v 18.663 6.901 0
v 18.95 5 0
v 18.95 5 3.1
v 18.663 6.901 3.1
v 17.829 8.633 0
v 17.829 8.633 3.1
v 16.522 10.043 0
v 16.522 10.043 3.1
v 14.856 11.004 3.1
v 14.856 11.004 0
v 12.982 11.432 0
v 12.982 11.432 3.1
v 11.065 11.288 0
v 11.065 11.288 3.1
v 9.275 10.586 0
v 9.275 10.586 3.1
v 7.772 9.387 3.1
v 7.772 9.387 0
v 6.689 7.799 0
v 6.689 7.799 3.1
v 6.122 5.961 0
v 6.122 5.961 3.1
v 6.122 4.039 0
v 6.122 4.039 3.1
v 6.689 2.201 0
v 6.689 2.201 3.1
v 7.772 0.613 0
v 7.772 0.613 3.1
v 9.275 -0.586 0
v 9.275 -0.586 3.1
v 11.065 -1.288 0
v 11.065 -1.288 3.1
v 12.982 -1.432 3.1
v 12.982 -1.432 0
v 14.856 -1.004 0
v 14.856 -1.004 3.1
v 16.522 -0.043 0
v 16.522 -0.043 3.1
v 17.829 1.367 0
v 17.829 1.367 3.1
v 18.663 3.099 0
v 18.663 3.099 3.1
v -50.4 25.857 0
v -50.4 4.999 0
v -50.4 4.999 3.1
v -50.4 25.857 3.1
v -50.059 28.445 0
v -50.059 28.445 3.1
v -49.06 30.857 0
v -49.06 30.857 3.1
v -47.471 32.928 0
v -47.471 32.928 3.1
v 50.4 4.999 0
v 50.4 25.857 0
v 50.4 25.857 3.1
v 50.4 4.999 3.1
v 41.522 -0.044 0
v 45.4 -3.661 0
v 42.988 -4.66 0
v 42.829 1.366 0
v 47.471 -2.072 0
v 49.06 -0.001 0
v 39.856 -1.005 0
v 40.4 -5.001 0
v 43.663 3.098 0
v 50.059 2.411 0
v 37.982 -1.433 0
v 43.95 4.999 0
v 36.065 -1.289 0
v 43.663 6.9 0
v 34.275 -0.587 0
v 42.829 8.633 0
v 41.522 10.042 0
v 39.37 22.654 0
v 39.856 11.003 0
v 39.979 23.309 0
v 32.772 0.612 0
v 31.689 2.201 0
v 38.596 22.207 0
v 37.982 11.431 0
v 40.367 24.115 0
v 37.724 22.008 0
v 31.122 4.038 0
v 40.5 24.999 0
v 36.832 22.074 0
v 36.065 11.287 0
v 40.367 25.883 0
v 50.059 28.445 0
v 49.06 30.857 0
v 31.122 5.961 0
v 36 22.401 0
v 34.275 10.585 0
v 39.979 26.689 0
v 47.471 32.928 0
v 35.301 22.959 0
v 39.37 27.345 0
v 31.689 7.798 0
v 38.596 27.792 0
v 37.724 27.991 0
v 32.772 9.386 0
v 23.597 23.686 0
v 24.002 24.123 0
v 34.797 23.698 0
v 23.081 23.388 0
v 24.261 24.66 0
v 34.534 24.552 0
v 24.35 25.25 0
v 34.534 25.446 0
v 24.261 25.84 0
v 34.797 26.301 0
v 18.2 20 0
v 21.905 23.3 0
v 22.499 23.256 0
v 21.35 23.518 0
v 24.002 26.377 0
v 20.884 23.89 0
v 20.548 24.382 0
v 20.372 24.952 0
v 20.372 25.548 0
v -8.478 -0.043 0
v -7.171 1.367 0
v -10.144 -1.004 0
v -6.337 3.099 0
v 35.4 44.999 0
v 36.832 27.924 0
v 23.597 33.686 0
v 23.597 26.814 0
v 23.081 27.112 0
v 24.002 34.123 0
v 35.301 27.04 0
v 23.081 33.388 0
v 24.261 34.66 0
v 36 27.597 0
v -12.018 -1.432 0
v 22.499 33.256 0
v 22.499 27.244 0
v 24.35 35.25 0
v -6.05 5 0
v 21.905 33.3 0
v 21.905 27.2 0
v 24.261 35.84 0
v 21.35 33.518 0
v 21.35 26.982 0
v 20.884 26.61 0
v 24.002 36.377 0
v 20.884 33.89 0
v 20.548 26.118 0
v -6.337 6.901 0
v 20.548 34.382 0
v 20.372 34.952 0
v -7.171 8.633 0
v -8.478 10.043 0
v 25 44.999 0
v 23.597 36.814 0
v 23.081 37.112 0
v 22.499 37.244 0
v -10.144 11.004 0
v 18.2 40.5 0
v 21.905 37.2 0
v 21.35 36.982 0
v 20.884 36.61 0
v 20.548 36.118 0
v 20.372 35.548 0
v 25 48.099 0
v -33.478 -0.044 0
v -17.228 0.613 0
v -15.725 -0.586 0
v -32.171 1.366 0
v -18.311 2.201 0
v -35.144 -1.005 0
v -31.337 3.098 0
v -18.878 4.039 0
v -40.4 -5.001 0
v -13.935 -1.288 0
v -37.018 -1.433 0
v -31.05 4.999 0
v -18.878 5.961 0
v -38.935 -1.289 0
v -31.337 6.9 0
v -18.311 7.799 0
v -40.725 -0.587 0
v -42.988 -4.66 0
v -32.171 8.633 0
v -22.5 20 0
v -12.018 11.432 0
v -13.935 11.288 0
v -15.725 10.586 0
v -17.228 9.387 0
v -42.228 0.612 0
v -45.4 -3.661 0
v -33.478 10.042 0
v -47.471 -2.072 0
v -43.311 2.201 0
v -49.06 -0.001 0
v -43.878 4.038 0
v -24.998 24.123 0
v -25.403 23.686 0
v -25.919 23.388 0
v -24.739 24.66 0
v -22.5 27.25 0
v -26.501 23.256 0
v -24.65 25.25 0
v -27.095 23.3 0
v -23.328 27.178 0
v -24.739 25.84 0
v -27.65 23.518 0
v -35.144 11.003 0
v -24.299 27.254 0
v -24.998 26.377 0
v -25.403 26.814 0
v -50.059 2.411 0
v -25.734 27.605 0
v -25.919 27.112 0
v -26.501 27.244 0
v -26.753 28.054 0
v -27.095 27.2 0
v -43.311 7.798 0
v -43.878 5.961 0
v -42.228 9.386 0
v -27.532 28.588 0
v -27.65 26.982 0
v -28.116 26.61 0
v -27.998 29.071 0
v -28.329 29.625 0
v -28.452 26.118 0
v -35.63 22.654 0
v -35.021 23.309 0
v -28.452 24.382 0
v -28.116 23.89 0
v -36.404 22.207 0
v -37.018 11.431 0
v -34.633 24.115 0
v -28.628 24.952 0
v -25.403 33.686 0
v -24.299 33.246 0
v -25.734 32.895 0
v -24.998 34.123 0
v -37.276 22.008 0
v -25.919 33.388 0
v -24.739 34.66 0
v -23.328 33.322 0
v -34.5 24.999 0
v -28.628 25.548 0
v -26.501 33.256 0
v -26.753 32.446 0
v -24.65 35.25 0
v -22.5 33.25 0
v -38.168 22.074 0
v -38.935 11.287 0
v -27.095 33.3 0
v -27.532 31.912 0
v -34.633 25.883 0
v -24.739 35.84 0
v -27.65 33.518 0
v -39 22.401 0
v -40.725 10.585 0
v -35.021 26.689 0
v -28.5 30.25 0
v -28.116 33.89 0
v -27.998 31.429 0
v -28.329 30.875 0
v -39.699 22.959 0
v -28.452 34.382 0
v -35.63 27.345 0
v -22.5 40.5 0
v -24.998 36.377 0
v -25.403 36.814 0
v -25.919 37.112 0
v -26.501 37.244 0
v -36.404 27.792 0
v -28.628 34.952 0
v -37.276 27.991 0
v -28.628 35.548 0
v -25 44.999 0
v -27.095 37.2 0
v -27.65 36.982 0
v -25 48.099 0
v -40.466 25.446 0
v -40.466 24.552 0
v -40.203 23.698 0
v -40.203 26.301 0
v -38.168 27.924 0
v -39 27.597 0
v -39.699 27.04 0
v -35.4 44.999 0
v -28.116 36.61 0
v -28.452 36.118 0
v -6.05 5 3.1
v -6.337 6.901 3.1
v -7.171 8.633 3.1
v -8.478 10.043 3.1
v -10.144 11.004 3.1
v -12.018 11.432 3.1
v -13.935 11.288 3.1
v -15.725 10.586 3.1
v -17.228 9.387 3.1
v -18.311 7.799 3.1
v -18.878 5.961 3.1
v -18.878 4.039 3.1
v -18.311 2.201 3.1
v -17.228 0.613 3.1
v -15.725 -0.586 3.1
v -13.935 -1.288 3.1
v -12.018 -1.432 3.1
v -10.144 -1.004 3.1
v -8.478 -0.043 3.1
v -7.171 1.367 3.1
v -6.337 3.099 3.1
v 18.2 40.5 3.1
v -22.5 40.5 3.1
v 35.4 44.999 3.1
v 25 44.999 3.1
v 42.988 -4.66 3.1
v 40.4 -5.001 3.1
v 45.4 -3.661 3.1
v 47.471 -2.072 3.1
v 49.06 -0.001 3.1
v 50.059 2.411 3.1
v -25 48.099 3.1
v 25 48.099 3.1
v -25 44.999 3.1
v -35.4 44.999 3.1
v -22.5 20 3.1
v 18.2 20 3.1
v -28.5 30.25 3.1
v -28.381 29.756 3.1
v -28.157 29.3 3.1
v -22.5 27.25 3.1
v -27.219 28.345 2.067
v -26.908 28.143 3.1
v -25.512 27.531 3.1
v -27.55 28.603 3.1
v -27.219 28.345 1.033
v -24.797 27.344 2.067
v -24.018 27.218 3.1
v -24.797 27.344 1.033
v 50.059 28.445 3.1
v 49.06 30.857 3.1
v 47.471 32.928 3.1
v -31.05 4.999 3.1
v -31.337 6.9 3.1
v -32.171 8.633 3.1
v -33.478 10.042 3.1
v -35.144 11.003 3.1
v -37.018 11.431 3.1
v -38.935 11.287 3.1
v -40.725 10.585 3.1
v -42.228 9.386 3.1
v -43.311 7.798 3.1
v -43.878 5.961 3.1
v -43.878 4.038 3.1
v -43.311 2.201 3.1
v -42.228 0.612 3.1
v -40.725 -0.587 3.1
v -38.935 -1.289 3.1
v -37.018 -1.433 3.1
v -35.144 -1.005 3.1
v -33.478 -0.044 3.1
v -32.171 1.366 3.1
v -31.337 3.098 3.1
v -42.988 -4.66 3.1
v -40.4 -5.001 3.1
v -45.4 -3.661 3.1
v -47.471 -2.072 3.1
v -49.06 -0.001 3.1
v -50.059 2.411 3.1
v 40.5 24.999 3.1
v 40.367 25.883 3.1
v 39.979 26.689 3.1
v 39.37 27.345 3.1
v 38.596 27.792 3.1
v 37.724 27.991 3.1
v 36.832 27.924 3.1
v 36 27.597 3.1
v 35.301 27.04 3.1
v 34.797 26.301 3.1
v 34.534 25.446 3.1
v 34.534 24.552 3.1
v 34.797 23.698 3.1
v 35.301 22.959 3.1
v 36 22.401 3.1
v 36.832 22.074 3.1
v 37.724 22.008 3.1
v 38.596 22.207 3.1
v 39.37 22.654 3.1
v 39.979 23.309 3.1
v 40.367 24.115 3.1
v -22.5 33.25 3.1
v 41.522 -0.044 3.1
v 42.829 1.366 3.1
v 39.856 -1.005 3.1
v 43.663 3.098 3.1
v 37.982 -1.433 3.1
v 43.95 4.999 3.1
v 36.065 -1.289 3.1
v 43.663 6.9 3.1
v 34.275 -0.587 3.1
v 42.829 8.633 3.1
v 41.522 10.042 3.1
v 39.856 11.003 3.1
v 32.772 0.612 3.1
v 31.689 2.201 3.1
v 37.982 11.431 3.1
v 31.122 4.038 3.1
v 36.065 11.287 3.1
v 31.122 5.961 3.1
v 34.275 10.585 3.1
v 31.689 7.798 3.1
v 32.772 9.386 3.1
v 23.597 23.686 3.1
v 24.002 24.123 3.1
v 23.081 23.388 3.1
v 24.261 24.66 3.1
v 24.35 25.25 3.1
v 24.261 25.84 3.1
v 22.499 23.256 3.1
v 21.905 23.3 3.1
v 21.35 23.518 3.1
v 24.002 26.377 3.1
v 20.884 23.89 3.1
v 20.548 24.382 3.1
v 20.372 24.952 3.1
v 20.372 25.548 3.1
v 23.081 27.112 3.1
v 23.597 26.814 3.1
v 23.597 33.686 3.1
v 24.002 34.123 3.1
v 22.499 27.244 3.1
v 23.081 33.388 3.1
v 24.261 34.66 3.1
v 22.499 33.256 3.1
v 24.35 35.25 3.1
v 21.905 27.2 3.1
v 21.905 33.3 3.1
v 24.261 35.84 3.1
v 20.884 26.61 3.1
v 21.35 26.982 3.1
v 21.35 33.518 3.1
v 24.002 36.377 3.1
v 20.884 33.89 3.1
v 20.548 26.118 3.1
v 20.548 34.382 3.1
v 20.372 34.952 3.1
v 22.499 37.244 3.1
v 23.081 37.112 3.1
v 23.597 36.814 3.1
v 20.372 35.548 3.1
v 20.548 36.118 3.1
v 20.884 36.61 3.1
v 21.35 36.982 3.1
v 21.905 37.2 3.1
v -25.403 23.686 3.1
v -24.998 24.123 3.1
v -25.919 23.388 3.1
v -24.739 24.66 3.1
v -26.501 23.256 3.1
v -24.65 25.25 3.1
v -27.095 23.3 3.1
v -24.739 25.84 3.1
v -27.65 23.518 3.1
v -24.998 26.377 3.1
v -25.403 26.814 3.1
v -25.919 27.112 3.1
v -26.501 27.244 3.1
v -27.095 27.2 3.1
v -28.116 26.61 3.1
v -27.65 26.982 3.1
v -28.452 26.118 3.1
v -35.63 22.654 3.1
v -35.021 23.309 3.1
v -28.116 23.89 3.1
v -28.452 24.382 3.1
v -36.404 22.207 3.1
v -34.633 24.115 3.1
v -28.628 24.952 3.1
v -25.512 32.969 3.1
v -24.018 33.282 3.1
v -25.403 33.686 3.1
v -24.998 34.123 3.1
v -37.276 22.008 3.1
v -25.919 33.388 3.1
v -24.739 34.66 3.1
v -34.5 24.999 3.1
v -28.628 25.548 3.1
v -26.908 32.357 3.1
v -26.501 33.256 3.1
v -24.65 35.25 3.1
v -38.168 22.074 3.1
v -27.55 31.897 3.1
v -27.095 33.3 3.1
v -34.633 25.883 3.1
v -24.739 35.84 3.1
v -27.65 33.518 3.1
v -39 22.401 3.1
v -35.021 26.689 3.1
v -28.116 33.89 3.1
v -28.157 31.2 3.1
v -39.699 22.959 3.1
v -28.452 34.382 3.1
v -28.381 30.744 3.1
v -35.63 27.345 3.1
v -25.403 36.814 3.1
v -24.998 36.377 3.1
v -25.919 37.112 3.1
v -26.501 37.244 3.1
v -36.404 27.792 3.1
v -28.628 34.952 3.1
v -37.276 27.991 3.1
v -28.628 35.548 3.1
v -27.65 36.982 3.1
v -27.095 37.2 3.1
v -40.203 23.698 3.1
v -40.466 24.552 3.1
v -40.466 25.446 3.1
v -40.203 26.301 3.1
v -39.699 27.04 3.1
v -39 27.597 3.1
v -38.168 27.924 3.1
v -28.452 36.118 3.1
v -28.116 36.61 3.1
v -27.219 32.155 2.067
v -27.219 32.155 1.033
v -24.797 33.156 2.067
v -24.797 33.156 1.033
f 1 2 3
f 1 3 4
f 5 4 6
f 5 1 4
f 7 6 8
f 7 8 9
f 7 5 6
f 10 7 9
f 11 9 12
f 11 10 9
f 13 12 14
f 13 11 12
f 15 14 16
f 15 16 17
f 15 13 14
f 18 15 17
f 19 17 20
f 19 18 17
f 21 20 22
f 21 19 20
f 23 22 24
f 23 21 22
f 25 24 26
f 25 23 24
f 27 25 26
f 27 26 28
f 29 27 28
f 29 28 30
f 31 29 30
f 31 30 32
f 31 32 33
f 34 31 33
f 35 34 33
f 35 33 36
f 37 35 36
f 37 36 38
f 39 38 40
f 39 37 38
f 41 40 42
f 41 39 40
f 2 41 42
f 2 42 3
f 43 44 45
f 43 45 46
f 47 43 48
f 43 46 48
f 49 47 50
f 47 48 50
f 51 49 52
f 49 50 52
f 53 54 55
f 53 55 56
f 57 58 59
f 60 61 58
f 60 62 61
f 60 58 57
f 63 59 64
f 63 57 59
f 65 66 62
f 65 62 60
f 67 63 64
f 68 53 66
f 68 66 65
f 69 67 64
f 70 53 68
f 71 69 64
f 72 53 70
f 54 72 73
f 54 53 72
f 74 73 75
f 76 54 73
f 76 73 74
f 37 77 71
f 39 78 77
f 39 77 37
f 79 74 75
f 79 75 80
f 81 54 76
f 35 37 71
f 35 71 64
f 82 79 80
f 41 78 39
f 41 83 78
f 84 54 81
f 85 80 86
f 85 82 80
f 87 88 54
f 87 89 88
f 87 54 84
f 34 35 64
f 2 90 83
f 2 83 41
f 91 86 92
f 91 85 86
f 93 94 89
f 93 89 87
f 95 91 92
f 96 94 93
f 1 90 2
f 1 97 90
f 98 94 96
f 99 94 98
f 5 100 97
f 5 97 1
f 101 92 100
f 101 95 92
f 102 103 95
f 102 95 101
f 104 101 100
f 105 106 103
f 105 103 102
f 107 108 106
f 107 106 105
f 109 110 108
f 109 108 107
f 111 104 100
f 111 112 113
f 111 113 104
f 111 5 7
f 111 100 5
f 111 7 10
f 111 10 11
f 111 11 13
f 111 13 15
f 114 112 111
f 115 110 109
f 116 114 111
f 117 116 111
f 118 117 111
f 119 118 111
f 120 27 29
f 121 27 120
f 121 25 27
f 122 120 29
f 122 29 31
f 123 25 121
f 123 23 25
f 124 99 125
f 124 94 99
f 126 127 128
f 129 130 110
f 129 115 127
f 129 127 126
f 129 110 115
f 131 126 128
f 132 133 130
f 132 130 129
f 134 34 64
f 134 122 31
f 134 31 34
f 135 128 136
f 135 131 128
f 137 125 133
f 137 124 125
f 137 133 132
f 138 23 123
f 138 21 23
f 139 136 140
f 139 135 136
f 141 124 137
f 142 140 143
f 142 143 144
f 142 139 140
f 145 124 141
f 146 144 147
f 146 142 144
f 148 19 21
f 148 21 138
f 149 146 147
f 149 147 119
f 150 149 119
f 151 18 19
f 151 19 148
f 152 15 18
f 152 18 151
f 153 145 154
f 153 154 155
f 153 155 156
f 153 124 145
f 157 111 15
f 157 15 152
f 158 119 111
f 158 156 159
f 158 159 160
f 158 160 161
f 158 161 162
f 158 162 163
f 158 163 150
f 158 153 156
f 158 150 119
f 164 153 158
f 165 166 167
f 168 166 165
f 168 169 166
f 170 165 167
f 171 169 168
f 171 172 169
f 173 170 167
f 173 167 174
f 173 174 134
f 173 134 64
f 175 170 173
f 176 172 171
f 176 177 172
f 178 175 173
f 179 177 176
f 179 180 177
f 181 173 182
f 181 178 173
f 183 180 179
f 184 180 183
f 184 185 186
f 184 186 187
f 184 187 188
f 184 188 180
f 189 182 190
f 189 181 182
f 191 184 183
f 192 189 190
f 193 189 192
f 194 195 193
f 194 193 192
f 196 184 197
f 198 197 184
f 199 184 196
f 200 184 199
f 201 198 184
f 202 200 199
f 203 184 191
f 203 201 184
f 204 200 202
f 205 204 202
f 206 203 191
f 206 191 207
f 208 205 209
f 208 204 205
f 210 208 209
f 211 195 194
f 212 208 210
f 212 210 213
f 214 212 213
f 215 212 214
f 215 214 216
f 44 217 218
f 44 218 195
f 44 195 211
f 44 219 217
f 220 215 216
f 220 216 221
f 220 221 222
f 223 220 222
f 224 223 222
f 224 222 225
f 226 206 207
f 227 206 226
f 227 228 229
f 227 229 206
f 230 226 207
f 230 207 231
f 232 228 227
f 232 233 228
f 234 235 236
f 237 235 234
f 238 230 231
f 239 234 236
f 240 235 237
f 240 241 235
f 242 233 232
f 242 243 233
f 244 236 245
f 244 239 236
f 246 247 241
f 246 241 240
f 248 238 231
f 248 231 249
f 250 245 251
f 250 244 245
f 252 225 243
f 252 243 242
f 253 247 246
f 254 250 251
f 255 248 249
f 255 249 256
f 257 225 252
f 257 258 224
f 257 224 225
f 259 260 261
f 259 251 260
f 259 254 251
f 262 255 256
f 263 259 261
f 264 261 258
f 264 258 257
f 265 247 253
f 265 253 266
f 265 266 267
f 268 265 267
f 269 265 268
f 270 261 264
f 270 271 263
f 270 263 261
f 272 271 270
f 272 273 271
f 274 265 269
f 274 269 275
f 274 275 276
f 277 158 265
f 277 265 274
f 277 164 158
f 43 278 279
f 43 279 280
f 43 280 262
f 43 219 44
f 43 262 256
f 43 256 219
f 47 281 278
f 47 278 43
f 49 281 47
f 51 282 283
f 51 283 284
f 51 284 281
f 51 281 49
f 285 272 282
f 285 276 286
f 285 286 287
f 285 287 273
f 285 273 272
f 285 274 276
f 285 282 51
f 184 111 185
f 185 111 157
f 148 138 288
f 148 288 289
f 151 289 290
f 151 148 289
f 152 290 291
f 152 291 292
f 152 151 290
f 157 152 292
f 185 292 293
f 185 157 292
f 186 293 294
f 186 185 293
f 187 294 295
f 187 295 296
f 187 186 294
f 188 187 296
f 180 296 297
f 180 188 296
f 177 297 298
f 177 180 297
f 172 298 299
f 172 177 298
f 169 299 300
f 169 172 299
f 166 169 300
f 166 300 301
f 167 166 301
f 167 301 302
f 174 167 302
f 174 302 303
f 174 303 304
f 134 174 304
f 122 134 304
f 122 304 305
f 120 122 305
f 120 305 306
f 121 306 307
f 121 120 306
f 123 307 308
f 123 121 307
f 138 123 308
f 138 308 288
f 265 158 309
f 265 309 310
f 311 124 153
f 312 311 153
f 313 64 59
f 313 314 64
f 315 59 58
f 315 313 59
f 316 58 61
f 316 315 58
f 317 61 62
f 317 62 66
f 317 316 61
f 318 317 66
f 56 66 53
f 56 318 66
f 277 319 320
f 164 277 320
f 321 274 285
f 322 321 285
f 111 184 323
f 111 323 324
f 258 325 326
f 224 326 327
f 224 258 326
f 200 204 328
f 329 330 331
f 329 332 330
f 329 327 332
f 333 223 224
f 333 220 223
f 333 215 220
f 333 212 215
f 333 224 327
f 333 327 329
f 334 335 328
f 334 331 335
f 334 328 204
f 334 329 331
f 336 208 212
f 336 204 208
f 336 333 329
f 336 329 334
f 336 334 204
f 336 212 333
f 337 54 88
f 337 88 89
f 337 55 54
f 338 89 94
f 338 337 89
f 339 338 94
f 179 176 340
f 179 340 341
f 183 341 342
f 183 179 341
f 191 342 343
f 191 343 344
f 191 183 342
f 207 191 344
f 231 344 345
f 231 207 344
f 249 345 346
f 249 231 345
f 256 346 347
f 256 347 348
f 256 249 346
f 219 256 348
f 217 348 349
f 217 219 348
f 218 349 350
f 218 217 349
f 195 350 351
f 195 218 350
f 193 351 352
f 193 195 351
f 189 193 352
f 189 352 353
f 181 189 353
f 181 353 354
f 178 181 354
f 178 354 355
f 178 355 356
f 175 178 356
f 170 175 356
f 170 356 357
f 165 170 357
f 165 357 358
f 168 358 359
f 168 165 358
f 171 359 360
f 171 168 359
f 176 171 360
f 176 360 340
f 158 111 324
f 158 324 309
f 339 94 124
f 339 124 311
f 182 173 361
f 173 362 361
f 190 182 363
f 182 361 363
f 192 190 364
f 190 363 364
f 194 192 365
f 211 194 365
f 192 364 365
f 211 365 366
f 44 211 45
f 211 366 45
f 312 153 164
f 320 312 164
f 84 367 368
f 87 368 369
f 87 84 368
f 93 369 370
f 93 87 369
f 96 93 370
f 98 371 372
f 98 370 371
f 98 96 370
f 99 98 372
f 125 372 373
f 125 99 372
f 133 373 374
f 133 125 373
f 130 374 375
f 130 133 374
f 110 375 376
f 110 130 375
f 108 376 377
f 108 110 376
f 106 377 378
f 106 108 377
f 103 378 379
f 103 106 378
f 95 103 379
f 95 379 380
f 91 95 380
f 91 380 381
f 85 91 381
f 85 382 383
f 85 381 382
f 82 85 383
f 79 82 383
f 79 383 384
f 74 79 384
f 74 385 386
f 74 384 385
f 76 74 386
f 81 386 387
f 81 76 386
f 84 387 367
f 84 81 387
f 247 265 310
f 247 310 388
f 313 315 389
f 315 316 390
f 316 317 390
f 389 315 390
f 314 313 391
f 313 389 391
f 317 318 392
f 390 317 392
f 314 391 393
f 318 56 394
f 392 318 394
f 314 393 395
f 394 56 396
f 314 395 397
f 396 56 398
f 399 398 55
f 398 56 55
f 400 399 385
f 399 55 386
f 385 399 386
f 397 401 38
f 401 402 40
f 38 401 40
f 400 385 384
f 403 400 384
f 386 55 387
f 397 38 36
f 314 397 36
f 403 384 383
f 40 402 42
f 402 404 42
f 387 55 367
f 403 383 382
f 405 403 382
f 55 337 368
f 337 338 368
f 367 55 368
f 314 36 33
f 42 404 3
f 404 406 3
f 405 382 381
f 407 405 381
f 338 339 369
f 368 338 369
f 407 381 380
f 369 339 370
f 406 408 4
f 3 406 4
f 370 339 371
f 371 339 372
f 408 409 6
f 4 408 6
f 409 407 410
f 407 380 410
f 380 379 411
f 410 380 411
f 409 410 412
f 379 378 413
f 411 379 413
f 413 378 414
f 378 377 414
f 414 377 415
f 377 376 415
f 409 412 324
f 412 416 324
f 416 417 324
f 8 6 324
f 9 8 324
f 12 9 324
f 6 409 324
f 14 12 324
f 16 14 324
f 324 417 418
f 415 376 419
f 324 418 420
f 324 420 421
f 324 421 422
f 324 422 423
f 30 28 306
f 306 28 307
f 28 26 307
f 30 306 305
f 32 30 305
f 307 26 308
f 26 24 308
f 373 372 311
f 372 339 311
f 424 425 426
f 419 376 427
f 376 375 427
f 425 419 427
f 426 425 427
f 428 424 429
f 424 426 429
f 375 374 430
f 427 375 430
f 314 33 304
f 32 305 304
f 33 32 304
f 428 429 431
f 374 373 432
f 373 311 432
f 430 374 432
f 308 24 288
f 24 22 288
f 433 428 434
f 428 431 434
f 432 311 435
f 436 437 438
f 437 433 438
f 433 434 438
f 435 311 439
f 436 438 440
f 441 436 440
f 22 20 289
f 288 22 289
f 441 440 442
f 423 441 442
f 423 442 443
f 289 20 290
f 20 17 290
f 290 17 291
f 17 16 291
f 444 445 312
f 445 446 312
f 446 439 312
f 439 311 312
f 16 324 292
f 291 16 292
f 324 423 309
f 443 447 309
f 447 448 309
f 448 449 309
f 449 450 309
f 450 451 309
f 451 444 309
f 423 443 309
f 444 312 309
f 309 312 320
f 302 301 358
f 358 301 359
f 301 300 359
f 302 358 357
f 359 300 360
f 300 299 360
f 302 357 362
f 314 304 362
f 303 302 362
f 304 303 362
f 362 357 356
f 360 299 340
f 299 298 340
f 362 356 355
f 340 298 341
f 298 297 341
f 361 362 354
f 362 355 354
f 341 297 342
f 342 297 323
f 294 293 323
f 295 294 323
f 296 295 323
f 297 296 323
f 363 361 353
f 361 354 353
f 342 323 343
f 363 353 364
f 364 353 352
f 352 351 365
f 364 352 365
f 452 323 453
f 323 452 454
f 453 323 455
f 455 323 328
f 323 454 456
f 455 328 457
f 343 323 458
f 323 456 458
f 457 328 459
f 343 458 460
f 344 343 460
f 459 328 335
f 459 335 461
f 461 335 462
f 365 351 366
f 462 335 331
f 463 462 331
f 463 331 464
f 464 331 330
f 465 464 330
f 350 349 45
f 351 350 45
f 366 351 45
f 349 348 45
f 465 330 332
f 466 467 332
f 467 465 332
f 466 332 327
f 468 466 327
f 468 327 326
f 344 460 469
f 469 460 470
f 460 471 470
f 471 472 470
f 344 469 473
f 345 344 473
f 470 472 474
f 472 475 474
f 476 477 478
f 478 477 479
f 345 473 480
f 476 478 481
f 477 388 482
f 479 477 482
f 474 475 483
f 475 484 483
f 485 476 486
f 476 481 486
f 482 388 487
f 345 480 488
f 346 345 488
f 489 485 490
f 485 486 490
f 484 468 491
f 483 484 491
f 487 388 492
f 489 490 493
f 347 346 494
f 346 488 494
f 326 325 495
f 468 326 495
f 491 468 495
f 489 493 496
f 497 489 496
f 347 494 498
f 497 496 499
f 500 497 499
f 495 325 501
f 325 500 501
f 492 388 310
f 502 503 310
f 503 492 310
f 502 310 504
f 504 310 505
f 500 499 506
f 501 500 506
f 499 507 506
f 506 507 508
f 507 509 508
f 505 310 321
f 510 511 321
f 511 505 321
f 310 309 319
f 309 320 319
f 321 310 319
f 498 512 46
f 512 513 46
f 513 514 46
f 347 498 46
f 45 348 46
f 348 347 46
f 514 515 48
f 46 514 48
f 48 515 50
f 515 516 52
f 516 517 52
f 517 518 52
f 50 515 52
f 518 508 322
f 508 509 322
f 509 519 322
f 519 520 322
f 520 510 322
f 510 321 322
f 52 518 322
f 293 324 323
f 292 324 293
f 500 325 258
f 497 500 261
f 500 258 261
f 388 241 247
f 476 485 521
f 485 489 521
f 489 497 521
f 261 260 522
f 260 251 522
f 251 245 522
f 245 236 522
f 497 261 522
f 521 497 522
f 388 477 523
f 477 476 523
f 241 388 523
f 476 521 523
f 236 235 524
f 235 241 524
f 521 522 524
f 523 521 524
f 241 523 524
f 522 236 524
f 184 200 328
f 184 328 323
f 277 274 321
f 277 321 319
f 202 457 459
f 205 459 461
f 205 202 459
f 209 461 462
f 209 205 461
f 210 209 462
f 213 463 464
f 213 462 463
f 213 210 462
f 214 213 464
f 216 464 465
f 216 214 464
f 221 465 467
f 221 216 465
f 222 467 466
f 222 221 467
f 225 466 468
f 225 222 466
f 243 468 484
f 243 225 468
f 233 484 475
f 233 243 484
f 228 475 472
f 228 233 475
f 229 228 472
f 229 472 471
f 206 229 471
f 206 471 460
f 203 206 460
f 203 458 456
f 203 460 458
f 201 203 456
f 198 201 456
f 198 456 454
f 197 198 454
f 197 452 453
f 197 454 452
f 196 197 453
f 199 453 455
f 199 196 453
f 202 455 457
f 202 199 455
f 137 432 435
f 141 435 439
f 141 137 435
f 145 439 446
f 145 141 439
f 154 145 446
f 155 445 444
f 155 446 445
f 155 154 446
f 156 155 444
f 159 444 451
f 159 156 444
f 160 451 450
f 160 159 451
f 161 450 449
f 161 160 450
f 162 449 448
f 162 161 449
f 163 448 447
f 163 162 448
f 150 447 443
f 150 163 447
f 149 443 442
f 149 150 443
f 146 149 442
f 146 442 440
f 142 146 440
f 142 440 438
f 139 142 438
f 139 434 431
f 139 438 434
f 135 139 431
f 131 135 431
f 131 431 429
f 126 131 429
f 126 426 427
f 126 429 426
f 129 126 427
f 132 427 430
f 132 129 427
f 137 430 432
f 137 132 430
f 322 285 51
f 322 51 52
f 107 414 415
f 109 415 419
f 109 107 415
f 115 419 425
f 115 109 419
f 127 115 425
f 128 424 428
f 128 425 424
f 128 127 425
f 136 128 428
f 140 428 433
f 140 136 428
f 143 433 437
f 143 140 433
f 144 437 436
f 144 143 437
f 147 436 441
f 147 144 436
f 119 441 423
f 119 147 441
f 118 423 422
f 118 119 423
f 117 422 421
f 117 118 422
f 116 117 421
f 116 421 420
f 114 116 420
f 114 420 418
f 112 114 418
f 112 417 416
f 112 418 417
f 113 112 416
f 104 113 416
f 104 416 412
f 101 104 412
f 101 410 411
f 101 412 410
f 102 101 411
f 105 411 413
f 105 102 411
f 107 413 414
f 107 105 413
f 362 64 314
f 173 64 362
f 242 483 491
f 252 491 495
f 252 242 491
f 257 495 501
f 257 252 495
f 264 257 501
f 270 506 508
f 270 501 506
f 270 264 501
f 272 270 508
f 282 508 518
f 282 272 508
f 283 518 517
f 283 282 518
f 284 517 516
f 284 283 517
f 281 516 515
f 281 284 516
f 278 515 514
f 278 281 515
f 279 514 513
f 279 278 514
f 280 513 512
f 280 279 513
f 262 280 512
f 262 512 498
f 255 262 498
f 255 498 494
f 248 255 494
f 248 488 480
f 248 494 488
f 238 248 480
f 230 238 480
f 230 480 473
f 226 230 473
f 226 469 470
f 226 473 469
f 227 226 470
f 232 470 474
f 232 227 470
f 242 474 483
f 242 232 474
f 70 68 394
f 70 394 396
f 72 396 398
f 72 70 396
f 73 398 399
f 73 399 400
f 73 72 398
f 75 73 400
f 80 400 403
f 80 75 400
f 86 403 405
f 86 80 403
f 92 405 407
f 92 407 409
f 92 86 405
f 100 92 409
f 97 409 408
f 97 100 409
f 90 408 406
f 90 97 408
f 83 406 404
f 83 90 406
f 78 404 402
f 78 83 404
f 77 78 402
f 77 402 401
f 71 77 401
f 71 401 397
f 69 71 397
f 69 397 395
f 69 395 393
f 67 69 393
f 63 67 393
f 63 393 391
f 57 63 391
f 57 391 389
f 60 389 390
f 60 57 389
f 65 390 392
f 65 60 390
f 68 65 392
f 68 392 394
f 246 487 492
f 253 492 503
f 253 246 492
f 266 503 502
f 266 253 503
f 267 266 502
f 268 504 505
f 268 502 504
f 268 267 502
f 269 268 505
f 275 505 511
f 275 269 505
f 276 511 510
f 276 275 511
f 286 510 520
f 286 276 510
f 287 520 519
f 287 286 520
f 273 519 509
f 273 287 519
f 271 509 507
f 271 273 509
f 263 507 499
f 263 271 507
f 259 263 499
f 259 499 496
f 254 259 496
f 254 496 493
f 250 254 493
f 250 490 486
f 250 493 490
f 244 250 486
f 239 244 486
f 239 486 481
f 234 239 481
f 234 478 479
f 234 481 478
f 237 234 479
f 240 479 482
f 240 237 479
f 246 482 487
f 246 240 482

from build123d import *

# Parameters (mm, degrees)
SKETCH4_R           = 6.45
BOSS_EXTRUDE3_DEPTH = 3.1
SKETCH5_R           = 2
SKETCH5_R_2         = 3
CUT_EXTRUDE4_DEPTH  = 4.1
FILLET1_R           = 10
SKETCH6_W           = 50
SKETCH6_H           = 3.1
BOSS_EXTRUDE4_DEPTH = 3.1
CHAMFER1_SIZE       = 15
FILLET2_R           = 10


with BuildPart() as part:
    # Sketch4 → Boss-Extrude3 (new body)
    with BuildSketch(Plane.XY):
        Polygon((50.399999987, -5.000794186), (-50.399999987, -5.000794186), (-50.399999987, 44.999205814), (-0.399999987, 44.999205814), (19.600000013, 44.999205814), (50.399999987, 44.999205814), align=None)
        with Locations((12.5, 5.000000001)):
            Circle(SKETCH4_R, mode=Mode.SUBTRACT)
        with Locations((-37.499999987, 4.999205814)):
            Circle(SKETCH4_R, mode=Mode.SUBTRACT)
        with Locations((37.499999987, 4.999205814)):
            Circle(SKETCH4_R, mode=Mode.SUBTRACT)
        with Locations((-12.5, 5.000000001)):
            Circle(SKETCH4_R, mode=Mode.SUBTRACT)
    extrude(amount=BOSS_EXTRUDE3_DEPTH)

    # Sketch5 → Cut-Extrude4 (cut, through all)
    with BuildSketch(Plane.XY):
        with Locations((22.35, 35.250000001)):
            Circle(SKETCH5_R)
        with Locations((22.35, 25.250000001)):
            Circle(SKETCH5_R)
        with Locations((-26.65, 25.250000001)):
            Circle(SKETCH5_R)
        with Locations((-26.65, 35.250000001)):
            Circle(SKETCH5_R)
        with Locations((37.5, 24.999205814)):
            Circle(SKETCH5_R_2)
        with Locations((-37.5, 24.999205814)):
            Circle(SKETCH5_R_2)
        with BuildLine():
            Line((-22.5, 20.000000001), (18.2, 20.000000001))
            Line((18.2, 20.000000001), (18.2, 40.500000001))
            Line((18.2, 40.500000001), (-22.5, 40.500000001))
            Line((-22.5, 40.500000001), (-22.5, 33.250000001))
            add(Edge.make_bspline(
                [(-28.5, 30.250000001), (-28.211982464, 32.604979652), (-24.313004512, 33.611534185), (-22.5, 33.250000001)],
                knots=[0, 0, 0, 0, 1, 1, 1, 1], degree=3))
            add(Edge.make_bspline(
                [(-28.5, 30.250000001), (-28.211982464, 27.89502035), (-24.313004512, 26.888465817), (-22.5, 27.250000001)],
                knots=[0, 0, 0, 0, 1, 1, 1, 1], degree=3))
            Line((-22.5, 27.250000001), (-22.5, 20.000000001))
        make_face()
    extrude(amount=CUT_EXTRUDE4_DEPTH, mode=Mode.SUBTRACT)

    # Fillet1
    fillet1_edges = [part.edges().sort_by_distance(p)[0] for p in [
        (50.399999987, -5.000794186, 1.55),
        (-50.399999987, -5.000794186, 1.55),
    ]]
    fillet(fillet1_edges, radius=FILLET1_R)

    # Sketch6 → Boss-Extrude4 (add, through all)
    with BuildSketch(Plane.XY.offset(3.1)):
        with Locations((0, 46.549205814)):
            Rectangle(SKETCH6_W, SKETCH6_H)
    extrude(amount=-BOSS_EXTRUDE4_DEPTH)

    # Chamfer1
    chamfer1_edges = [part.edges().sort_by_distance(p)[0] for p in [
        (50.399999987, 44.999205814, 1.55),
        (-50.399999987, 44.999205814, 1.55),
    ]]
    chamfer(chamfer1_edges, length=CHAMFER1_SIZE)

    # Fillet2
    fillet2_edges = [part.edges().sort_by_distance(p)[0] for p in [
        (-50.399999987, 29.999205814, 1.55),
        (50.399999987, 29.999205814, 1.55),
    ]]
    fillet(fillet2_edges, radius=FILLET2_R)


solid = part.part
